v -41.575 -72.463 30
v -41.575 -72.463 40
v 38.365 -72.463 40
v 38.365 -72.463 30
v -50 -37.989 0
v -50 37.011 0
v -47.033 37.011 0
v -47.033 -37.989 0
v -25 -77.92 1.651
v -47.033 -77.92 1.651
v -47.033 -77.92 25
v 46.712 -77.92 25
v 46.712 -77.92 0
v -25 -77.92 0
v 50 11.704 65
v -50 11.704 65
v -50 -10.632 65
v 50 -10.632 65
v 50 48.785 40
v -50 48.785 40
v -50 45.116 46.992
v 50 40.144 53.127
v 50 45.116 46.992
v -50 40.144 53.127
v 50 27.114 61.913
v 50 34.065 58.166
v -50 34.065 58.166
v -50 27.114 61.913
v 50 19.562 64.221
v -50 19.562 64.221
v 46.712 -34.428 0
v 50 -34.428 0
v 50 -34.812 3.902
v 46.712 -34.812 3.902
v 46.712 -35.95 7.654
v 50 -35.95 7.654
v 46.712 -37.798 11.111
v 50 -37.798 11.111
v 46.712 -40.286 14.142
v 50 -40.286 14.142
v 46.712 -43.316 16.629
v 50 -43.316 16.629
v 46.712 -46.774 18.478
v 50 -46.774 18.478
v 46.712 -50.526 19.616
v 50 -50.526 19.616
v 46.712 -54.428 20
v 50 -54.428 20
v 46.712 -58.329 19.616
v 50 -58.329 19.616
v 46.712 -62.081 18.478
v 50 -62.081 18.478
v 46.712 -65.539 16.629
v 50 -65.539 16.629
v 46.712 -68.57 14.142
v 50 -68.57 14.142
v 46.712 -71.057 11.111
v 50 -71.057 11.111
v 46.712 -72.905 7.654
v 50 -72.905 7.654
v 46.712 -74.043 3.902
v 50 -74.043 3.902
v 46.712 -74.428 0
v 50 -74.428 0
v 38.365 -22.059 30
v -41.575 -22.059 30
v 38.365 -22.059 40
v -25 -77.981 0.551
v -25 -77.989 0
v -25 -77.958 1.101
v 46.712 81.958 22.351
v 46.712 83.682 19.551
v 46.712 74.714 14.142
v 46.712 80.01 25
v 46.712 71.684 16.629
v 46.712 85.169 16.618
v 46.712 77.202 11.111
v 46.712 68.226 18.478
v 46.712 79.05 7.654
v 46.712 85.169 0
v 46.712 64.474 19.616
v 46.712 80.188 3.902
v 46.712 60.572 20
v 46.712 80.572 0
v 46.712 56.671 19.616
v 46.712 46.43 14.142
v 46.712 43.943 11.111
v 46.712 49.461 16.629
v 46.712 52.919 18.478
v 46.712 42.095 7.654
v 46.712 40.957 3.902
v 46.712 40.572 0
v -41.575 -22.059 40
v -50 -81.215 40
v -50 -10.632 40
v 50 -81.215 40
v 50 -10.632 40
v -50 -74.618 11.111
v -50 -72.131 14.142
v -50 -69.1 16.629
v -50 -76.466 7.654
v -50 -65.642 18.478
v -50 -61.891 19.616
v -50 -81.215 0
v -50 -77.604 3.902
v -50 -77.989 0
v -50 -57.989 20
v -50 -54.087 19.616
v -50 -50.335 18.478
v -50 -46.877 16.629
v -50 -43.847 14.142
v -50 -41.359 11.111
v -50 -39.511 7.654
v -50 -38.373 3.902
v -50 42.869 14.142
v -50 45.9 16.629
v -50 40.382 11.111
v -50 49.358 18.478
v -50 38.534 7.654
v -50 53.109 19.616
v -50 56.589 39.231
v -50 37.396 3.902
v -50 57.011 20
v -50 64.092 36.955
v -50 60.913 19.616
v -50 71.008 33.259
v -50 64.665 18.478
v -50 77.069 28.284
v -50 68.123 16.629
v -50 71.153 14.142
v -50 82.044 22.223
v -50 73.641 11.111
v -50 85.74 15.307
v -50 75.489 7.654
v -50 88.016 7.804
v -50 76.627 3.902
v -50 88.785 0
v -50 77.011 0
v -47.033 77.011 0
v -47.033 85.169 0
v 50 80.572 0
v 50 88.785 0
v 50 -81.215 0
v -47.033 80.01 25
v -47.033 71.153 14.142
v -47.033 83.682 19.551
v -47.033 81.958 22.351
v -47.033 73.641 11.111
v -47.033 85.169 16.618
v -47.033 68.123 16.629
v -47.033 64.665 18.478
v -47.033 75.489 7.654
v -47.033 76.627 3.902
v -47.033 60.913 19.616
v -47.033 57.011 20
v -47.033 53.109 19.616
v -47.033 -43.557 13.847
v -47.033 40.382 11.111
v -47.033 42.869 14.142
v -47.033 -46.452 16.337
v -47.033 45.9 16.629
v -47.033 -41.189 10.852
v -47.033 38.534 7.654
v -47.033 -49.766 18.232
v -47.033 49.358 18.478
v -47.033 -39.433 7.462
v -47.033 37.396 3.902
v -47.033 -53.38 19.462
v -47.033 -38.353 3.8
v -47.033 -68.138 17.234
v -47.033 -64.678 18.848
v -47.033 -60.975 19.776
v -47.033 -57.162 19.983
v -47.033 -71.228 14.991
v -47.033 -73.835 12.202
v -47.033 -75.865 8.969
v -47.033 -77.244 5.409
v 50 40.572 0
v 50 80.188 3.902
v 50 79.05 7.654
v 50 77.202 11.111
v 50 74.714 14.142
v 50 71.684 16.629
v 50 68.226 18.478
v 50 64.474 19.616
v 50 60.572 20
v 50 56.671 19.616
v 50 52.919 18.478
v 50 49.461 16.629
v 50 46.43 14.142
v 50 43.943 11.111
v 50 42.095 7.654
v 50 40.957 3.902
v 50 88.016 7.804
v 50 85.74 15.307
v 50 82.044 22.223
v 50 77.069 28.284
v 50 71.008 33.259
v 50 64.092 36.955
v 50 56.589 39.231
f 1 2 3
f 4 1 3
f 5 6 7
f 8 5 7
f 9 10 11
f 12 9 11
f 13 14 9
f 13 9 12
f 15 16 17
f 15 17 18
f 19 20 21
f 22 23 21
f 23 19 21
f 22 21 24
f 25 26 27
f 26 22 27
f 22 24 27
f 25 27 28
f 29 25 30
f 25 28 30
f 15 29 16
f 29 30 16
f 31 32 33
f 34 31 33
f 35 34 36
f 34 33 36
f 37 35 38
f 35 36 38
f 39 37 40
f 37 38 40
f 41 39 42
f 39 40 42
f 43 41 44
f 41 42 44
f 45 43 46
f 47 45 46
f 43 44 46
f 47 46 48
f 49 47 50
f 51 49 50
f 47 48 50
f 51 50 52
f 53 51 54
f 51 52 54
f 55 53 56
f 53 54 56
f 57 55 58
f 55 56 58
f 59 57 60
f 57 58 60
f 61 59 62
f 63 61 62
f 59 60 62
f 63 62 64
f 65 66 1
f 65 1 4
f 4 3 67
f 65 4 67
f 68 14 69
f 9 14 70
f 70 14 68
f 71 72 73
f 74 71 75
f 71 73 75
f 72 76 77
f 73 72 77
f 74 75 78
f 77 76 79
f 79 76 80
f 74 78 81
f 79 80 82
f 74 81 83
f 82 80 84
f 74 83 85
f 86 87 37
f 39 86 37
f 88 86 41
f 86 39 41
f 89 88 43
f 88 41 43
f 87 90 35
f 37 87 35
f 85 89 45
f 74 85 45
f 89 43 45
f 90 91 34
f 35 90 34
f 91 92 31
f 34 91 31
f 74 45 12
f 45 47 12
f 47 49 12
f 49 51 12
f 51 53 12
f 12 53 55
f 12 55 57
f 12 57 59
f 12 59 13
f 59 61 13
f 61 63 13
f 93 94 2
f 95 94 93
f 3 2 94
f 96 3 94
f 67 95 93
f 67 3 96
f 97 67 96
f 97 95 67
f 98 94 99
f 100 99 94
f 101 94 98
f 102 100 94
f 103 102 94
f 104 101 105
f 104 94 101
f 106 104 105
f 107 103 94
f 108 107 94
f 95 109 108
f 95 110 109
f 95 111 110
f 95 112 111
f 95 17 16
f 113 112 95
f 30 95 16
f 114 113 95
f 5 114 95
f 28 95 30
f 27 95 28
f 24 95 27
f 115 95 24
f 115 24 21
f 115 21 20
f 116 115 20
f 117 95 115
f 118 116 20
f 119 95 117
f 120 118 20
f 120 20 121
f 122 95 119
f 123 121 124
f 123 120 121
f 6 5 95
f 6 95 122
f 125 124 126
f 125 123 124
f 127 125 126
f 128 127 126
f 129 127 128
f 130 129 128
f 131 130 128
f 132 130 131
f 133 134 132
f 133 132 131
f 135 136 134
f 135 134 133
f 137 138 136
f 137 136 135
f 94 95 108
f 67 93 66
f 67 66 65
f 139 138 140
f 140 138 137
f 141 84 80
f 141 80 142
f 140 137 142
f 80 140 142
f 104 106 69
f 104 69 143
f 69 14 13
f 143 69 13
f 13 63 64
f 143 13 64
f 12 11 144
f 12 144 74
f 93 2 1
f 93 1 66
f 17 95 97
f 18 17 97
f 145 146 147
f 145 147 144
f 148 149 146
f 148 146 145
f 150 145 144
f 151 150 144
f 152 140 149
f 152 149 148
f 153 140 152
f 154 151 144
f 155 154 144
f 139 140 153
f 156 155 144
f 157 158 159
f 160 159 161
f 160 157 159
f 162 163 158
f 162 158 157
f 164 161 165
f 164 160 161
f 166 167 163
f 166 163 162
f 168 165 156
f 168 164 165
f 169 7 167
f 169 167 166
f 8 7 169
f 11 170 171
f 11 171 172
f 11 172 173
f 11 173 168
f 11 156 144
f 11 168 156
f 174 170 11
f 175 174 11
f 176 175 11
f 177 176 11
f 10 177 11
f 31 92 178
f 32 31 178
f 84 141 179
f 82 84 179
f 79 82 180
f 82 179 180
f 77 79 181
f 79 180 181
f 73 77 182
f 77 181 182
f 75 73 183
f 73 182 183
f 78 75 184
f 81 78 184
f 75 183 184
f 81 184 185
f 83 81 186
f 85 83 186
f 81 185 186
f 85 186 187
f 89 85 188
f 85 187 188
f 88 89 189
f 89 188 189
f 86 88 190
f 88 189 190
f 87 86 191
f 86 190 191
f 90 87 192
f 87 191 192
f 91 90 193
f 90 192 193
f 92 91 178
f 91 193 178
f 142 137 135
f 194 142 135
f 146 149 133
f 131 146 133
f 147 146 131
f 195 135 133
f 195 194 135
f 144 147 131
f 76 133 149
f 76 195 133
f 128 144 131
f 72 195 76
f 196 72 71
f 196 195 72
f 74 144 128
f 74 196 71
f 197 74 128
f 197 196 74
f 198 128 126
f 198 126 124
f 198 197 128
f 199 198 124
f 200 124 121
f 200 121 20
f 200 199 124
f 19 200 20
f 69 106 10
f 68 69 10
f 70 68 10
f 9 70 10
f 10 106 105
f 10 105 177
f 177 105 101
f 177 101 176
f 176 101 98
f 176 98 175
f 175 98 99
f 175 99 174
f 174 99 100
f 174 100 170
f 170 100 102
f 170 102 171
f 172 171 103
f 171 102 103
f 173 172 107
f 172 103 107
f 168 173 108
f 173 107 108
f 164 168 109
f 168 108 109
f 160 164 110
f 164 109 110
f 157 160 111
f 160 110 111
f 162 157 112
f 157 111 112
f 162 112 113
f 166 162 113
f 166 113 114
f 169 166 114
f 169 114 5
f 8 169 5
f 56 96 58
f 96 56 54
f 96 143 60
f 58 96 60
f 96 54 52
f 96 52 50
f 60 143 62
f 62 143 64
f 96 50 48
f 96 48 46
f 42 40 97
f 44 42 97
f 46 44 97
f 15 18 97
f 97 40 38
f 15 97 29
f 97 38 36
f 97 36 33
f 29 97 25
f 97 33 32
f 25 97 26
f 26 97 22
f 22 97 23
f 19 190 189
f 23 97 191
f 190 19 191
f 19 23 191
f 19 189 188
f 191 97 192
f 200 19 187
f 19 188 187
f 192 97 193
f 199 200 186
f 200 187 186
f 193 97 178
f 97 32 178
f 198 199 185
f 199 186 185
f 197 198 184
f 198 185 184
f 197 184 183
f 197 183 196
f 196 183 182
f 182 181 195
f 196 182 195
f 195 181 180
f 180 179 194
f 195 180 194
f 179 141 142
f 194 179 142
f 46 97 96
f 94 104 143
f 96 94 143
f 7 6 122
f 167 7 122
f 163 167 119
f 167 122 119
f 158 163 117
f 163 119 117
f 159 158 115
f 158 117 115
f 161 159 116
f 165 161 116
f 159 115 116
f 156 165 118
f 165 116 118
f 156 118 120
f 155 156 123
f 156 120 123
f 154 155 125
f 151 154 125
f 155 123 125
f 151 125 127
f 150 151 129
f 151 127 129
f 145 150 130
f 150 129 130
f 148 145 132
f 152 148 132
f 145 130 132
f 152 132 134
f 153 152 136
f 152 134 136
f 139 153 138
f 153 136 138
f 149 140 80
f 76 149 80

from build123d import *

# Parameters (mm, degrees)
F0_W        = 100
F0_H        = 170
F1_DEPTH    = 40
F2_R        = 39.99999
F3_W        = 100
F3_H        = 59.416816481
F4_DEPTH    = 25
F5_T1_DEPTH = 285.4049621774
F7_DEPTH    = 25
F8_W        = 93.7445983291
F8_H        = 163.0899235606
F9_DEPTH    = 25
F11_DEPTH   = 25
F12_W       = 79.9397490919
F12_H       = 50.4037756473
F13_DEPTH   = 10


# Not quite as in the source:
# - a fillet or chamfer that OpenCascade refuses, or shapes differently, is made with other operations: its cross-section is extruded or revolved along the edge and cut away or added
# - a fillet or chamfer is up to 0.001 mm smaller than in the source, because OpenCascade refuses the exact size


with BuildPart() as f1:
    # F0 (on Top) → F1 (new body)
    with BuildSketch(Plane.XY):
        with Locations((0, 3.7849953254)):
            Rectangle(F0_W, F0_H)
    extrude(amount=F1_DEPTH)

    # F2 (radius 40 in the source; OpenCascade refuses exactly that, so slightly less here)
    f2_edges = [f1.edges().sort_by_distance(p)[0] for p in [
        (0, 88.784995, 40),
    ]]
    fillet(f2_edges, radius=F2_R)

    # F3 (on face) → F4 (join)
    with BuildSketch(Plane.XY.offset(40)):
        with Locations((0, 19.0765870849)):
            Rectangle(F3_W, F3_H)
    extrude(amount=F4_DEPTH)

    # F5: fillet of radius 40 on 1 edges, made by hand

    # F5_s2 → F5_t1 (cut)
    with BuildSketch(Plane.YZ.offset(-142.7024810887)):
        with BuildLine():
            ThreePointArc((48.7849953254, 40), (34.0646826649, 58.1662479036), (11.7040028899, 65))
            Line((11.7040028899, 65), (48.7849953254, 65))
            Line((48.7849953254, 65), (48.7849953254, 40))
        make_face()
    extrude(amount=F5_T1_DEPTH, mode=Mode.SUBTRACT)

    # F6 (on face) → F7 (cut)
    with BuildSketch(Plane.YZ.offset(50)):
        with BuildLine():
            Line((-74.4276870787, 0), (-34.4276870787, 0))
            ThreePointArc((-34.4276870787, 0), (-54.4276870787, 20), (-74.4276870787, 0))
        make_face()
        with BuildLine():
            ThreePointArc((80.5723129213, 0), (60.5723129213, 20), (40.5723129213, 0))
            Line((40.5723129213, 0), (80.5723129213, 0))
        make_face()
    extrude(amount=-F7_DEPTH, mode=Mode.SUBTRACT)

    # F8 (on face) → F9 (cut)
    with BuildSketch(Plane(origin=(0, 0, 0), x_dir=(1, 0, 0), z_dir=(0, 0, -1))):
        with Locations((-0.160522759, -3.6244727671)):
            Rectangle(F8_W, F8_H)
    extrude(amount=-F9_DEPTH, mode=Mode.SUBTRACT)

    # F10 (on face) → F11 (cut)
    with BuildSketch(Plane(origin=(-50, 0, 0), x_dir=(0, -1, 0), z_dir=(-1, 0, 0))):
        with BuildLine():
            ThreePointArc((-77.0112355053, 0), (-57.0112355053, -20), (-37.0112355053, 0))
            Line((-37.0112355053, 0), (-77.0112355053, 0))
        make_face()
        with BuildLine():
            ThreePointArc((77.9887644947, 0), (57.9887644947, 20), (37.9887644947, 0))
            Line((37.9887644947, 0), (77.9887644947, 0))
        make_face()
        with BuildLine():
            Line((-77.0112355053, 0), (-37.0112355053, 0))
            ThreePointArc((-37.0112355053, 0), (-57.0112355053, 20), (-77.0112355053, 0))
        make_face()
        with BuildLine():
            Line((77.9887644947, 0), (37.9887644947, 0))
            ThreePointArc((37.9887644947, 0), (57.9887644947, -20), (77.9887644947, 0))
        make_face()
    extrude(amount=-F11_DEPTH, mode=Mode.SUBTRACT)

    # F12 (on face) → F13 (cut)
    with BuildSketch(Plane.XY.offset(40)):
        with Locations((-1.6052145511, -47.2608646378)):
            Rectangle(F12_W, F12_H)
    extrude(amount=-F13_DEPTH, mode=Mode.SUBTRACT)


solid = f1.part
